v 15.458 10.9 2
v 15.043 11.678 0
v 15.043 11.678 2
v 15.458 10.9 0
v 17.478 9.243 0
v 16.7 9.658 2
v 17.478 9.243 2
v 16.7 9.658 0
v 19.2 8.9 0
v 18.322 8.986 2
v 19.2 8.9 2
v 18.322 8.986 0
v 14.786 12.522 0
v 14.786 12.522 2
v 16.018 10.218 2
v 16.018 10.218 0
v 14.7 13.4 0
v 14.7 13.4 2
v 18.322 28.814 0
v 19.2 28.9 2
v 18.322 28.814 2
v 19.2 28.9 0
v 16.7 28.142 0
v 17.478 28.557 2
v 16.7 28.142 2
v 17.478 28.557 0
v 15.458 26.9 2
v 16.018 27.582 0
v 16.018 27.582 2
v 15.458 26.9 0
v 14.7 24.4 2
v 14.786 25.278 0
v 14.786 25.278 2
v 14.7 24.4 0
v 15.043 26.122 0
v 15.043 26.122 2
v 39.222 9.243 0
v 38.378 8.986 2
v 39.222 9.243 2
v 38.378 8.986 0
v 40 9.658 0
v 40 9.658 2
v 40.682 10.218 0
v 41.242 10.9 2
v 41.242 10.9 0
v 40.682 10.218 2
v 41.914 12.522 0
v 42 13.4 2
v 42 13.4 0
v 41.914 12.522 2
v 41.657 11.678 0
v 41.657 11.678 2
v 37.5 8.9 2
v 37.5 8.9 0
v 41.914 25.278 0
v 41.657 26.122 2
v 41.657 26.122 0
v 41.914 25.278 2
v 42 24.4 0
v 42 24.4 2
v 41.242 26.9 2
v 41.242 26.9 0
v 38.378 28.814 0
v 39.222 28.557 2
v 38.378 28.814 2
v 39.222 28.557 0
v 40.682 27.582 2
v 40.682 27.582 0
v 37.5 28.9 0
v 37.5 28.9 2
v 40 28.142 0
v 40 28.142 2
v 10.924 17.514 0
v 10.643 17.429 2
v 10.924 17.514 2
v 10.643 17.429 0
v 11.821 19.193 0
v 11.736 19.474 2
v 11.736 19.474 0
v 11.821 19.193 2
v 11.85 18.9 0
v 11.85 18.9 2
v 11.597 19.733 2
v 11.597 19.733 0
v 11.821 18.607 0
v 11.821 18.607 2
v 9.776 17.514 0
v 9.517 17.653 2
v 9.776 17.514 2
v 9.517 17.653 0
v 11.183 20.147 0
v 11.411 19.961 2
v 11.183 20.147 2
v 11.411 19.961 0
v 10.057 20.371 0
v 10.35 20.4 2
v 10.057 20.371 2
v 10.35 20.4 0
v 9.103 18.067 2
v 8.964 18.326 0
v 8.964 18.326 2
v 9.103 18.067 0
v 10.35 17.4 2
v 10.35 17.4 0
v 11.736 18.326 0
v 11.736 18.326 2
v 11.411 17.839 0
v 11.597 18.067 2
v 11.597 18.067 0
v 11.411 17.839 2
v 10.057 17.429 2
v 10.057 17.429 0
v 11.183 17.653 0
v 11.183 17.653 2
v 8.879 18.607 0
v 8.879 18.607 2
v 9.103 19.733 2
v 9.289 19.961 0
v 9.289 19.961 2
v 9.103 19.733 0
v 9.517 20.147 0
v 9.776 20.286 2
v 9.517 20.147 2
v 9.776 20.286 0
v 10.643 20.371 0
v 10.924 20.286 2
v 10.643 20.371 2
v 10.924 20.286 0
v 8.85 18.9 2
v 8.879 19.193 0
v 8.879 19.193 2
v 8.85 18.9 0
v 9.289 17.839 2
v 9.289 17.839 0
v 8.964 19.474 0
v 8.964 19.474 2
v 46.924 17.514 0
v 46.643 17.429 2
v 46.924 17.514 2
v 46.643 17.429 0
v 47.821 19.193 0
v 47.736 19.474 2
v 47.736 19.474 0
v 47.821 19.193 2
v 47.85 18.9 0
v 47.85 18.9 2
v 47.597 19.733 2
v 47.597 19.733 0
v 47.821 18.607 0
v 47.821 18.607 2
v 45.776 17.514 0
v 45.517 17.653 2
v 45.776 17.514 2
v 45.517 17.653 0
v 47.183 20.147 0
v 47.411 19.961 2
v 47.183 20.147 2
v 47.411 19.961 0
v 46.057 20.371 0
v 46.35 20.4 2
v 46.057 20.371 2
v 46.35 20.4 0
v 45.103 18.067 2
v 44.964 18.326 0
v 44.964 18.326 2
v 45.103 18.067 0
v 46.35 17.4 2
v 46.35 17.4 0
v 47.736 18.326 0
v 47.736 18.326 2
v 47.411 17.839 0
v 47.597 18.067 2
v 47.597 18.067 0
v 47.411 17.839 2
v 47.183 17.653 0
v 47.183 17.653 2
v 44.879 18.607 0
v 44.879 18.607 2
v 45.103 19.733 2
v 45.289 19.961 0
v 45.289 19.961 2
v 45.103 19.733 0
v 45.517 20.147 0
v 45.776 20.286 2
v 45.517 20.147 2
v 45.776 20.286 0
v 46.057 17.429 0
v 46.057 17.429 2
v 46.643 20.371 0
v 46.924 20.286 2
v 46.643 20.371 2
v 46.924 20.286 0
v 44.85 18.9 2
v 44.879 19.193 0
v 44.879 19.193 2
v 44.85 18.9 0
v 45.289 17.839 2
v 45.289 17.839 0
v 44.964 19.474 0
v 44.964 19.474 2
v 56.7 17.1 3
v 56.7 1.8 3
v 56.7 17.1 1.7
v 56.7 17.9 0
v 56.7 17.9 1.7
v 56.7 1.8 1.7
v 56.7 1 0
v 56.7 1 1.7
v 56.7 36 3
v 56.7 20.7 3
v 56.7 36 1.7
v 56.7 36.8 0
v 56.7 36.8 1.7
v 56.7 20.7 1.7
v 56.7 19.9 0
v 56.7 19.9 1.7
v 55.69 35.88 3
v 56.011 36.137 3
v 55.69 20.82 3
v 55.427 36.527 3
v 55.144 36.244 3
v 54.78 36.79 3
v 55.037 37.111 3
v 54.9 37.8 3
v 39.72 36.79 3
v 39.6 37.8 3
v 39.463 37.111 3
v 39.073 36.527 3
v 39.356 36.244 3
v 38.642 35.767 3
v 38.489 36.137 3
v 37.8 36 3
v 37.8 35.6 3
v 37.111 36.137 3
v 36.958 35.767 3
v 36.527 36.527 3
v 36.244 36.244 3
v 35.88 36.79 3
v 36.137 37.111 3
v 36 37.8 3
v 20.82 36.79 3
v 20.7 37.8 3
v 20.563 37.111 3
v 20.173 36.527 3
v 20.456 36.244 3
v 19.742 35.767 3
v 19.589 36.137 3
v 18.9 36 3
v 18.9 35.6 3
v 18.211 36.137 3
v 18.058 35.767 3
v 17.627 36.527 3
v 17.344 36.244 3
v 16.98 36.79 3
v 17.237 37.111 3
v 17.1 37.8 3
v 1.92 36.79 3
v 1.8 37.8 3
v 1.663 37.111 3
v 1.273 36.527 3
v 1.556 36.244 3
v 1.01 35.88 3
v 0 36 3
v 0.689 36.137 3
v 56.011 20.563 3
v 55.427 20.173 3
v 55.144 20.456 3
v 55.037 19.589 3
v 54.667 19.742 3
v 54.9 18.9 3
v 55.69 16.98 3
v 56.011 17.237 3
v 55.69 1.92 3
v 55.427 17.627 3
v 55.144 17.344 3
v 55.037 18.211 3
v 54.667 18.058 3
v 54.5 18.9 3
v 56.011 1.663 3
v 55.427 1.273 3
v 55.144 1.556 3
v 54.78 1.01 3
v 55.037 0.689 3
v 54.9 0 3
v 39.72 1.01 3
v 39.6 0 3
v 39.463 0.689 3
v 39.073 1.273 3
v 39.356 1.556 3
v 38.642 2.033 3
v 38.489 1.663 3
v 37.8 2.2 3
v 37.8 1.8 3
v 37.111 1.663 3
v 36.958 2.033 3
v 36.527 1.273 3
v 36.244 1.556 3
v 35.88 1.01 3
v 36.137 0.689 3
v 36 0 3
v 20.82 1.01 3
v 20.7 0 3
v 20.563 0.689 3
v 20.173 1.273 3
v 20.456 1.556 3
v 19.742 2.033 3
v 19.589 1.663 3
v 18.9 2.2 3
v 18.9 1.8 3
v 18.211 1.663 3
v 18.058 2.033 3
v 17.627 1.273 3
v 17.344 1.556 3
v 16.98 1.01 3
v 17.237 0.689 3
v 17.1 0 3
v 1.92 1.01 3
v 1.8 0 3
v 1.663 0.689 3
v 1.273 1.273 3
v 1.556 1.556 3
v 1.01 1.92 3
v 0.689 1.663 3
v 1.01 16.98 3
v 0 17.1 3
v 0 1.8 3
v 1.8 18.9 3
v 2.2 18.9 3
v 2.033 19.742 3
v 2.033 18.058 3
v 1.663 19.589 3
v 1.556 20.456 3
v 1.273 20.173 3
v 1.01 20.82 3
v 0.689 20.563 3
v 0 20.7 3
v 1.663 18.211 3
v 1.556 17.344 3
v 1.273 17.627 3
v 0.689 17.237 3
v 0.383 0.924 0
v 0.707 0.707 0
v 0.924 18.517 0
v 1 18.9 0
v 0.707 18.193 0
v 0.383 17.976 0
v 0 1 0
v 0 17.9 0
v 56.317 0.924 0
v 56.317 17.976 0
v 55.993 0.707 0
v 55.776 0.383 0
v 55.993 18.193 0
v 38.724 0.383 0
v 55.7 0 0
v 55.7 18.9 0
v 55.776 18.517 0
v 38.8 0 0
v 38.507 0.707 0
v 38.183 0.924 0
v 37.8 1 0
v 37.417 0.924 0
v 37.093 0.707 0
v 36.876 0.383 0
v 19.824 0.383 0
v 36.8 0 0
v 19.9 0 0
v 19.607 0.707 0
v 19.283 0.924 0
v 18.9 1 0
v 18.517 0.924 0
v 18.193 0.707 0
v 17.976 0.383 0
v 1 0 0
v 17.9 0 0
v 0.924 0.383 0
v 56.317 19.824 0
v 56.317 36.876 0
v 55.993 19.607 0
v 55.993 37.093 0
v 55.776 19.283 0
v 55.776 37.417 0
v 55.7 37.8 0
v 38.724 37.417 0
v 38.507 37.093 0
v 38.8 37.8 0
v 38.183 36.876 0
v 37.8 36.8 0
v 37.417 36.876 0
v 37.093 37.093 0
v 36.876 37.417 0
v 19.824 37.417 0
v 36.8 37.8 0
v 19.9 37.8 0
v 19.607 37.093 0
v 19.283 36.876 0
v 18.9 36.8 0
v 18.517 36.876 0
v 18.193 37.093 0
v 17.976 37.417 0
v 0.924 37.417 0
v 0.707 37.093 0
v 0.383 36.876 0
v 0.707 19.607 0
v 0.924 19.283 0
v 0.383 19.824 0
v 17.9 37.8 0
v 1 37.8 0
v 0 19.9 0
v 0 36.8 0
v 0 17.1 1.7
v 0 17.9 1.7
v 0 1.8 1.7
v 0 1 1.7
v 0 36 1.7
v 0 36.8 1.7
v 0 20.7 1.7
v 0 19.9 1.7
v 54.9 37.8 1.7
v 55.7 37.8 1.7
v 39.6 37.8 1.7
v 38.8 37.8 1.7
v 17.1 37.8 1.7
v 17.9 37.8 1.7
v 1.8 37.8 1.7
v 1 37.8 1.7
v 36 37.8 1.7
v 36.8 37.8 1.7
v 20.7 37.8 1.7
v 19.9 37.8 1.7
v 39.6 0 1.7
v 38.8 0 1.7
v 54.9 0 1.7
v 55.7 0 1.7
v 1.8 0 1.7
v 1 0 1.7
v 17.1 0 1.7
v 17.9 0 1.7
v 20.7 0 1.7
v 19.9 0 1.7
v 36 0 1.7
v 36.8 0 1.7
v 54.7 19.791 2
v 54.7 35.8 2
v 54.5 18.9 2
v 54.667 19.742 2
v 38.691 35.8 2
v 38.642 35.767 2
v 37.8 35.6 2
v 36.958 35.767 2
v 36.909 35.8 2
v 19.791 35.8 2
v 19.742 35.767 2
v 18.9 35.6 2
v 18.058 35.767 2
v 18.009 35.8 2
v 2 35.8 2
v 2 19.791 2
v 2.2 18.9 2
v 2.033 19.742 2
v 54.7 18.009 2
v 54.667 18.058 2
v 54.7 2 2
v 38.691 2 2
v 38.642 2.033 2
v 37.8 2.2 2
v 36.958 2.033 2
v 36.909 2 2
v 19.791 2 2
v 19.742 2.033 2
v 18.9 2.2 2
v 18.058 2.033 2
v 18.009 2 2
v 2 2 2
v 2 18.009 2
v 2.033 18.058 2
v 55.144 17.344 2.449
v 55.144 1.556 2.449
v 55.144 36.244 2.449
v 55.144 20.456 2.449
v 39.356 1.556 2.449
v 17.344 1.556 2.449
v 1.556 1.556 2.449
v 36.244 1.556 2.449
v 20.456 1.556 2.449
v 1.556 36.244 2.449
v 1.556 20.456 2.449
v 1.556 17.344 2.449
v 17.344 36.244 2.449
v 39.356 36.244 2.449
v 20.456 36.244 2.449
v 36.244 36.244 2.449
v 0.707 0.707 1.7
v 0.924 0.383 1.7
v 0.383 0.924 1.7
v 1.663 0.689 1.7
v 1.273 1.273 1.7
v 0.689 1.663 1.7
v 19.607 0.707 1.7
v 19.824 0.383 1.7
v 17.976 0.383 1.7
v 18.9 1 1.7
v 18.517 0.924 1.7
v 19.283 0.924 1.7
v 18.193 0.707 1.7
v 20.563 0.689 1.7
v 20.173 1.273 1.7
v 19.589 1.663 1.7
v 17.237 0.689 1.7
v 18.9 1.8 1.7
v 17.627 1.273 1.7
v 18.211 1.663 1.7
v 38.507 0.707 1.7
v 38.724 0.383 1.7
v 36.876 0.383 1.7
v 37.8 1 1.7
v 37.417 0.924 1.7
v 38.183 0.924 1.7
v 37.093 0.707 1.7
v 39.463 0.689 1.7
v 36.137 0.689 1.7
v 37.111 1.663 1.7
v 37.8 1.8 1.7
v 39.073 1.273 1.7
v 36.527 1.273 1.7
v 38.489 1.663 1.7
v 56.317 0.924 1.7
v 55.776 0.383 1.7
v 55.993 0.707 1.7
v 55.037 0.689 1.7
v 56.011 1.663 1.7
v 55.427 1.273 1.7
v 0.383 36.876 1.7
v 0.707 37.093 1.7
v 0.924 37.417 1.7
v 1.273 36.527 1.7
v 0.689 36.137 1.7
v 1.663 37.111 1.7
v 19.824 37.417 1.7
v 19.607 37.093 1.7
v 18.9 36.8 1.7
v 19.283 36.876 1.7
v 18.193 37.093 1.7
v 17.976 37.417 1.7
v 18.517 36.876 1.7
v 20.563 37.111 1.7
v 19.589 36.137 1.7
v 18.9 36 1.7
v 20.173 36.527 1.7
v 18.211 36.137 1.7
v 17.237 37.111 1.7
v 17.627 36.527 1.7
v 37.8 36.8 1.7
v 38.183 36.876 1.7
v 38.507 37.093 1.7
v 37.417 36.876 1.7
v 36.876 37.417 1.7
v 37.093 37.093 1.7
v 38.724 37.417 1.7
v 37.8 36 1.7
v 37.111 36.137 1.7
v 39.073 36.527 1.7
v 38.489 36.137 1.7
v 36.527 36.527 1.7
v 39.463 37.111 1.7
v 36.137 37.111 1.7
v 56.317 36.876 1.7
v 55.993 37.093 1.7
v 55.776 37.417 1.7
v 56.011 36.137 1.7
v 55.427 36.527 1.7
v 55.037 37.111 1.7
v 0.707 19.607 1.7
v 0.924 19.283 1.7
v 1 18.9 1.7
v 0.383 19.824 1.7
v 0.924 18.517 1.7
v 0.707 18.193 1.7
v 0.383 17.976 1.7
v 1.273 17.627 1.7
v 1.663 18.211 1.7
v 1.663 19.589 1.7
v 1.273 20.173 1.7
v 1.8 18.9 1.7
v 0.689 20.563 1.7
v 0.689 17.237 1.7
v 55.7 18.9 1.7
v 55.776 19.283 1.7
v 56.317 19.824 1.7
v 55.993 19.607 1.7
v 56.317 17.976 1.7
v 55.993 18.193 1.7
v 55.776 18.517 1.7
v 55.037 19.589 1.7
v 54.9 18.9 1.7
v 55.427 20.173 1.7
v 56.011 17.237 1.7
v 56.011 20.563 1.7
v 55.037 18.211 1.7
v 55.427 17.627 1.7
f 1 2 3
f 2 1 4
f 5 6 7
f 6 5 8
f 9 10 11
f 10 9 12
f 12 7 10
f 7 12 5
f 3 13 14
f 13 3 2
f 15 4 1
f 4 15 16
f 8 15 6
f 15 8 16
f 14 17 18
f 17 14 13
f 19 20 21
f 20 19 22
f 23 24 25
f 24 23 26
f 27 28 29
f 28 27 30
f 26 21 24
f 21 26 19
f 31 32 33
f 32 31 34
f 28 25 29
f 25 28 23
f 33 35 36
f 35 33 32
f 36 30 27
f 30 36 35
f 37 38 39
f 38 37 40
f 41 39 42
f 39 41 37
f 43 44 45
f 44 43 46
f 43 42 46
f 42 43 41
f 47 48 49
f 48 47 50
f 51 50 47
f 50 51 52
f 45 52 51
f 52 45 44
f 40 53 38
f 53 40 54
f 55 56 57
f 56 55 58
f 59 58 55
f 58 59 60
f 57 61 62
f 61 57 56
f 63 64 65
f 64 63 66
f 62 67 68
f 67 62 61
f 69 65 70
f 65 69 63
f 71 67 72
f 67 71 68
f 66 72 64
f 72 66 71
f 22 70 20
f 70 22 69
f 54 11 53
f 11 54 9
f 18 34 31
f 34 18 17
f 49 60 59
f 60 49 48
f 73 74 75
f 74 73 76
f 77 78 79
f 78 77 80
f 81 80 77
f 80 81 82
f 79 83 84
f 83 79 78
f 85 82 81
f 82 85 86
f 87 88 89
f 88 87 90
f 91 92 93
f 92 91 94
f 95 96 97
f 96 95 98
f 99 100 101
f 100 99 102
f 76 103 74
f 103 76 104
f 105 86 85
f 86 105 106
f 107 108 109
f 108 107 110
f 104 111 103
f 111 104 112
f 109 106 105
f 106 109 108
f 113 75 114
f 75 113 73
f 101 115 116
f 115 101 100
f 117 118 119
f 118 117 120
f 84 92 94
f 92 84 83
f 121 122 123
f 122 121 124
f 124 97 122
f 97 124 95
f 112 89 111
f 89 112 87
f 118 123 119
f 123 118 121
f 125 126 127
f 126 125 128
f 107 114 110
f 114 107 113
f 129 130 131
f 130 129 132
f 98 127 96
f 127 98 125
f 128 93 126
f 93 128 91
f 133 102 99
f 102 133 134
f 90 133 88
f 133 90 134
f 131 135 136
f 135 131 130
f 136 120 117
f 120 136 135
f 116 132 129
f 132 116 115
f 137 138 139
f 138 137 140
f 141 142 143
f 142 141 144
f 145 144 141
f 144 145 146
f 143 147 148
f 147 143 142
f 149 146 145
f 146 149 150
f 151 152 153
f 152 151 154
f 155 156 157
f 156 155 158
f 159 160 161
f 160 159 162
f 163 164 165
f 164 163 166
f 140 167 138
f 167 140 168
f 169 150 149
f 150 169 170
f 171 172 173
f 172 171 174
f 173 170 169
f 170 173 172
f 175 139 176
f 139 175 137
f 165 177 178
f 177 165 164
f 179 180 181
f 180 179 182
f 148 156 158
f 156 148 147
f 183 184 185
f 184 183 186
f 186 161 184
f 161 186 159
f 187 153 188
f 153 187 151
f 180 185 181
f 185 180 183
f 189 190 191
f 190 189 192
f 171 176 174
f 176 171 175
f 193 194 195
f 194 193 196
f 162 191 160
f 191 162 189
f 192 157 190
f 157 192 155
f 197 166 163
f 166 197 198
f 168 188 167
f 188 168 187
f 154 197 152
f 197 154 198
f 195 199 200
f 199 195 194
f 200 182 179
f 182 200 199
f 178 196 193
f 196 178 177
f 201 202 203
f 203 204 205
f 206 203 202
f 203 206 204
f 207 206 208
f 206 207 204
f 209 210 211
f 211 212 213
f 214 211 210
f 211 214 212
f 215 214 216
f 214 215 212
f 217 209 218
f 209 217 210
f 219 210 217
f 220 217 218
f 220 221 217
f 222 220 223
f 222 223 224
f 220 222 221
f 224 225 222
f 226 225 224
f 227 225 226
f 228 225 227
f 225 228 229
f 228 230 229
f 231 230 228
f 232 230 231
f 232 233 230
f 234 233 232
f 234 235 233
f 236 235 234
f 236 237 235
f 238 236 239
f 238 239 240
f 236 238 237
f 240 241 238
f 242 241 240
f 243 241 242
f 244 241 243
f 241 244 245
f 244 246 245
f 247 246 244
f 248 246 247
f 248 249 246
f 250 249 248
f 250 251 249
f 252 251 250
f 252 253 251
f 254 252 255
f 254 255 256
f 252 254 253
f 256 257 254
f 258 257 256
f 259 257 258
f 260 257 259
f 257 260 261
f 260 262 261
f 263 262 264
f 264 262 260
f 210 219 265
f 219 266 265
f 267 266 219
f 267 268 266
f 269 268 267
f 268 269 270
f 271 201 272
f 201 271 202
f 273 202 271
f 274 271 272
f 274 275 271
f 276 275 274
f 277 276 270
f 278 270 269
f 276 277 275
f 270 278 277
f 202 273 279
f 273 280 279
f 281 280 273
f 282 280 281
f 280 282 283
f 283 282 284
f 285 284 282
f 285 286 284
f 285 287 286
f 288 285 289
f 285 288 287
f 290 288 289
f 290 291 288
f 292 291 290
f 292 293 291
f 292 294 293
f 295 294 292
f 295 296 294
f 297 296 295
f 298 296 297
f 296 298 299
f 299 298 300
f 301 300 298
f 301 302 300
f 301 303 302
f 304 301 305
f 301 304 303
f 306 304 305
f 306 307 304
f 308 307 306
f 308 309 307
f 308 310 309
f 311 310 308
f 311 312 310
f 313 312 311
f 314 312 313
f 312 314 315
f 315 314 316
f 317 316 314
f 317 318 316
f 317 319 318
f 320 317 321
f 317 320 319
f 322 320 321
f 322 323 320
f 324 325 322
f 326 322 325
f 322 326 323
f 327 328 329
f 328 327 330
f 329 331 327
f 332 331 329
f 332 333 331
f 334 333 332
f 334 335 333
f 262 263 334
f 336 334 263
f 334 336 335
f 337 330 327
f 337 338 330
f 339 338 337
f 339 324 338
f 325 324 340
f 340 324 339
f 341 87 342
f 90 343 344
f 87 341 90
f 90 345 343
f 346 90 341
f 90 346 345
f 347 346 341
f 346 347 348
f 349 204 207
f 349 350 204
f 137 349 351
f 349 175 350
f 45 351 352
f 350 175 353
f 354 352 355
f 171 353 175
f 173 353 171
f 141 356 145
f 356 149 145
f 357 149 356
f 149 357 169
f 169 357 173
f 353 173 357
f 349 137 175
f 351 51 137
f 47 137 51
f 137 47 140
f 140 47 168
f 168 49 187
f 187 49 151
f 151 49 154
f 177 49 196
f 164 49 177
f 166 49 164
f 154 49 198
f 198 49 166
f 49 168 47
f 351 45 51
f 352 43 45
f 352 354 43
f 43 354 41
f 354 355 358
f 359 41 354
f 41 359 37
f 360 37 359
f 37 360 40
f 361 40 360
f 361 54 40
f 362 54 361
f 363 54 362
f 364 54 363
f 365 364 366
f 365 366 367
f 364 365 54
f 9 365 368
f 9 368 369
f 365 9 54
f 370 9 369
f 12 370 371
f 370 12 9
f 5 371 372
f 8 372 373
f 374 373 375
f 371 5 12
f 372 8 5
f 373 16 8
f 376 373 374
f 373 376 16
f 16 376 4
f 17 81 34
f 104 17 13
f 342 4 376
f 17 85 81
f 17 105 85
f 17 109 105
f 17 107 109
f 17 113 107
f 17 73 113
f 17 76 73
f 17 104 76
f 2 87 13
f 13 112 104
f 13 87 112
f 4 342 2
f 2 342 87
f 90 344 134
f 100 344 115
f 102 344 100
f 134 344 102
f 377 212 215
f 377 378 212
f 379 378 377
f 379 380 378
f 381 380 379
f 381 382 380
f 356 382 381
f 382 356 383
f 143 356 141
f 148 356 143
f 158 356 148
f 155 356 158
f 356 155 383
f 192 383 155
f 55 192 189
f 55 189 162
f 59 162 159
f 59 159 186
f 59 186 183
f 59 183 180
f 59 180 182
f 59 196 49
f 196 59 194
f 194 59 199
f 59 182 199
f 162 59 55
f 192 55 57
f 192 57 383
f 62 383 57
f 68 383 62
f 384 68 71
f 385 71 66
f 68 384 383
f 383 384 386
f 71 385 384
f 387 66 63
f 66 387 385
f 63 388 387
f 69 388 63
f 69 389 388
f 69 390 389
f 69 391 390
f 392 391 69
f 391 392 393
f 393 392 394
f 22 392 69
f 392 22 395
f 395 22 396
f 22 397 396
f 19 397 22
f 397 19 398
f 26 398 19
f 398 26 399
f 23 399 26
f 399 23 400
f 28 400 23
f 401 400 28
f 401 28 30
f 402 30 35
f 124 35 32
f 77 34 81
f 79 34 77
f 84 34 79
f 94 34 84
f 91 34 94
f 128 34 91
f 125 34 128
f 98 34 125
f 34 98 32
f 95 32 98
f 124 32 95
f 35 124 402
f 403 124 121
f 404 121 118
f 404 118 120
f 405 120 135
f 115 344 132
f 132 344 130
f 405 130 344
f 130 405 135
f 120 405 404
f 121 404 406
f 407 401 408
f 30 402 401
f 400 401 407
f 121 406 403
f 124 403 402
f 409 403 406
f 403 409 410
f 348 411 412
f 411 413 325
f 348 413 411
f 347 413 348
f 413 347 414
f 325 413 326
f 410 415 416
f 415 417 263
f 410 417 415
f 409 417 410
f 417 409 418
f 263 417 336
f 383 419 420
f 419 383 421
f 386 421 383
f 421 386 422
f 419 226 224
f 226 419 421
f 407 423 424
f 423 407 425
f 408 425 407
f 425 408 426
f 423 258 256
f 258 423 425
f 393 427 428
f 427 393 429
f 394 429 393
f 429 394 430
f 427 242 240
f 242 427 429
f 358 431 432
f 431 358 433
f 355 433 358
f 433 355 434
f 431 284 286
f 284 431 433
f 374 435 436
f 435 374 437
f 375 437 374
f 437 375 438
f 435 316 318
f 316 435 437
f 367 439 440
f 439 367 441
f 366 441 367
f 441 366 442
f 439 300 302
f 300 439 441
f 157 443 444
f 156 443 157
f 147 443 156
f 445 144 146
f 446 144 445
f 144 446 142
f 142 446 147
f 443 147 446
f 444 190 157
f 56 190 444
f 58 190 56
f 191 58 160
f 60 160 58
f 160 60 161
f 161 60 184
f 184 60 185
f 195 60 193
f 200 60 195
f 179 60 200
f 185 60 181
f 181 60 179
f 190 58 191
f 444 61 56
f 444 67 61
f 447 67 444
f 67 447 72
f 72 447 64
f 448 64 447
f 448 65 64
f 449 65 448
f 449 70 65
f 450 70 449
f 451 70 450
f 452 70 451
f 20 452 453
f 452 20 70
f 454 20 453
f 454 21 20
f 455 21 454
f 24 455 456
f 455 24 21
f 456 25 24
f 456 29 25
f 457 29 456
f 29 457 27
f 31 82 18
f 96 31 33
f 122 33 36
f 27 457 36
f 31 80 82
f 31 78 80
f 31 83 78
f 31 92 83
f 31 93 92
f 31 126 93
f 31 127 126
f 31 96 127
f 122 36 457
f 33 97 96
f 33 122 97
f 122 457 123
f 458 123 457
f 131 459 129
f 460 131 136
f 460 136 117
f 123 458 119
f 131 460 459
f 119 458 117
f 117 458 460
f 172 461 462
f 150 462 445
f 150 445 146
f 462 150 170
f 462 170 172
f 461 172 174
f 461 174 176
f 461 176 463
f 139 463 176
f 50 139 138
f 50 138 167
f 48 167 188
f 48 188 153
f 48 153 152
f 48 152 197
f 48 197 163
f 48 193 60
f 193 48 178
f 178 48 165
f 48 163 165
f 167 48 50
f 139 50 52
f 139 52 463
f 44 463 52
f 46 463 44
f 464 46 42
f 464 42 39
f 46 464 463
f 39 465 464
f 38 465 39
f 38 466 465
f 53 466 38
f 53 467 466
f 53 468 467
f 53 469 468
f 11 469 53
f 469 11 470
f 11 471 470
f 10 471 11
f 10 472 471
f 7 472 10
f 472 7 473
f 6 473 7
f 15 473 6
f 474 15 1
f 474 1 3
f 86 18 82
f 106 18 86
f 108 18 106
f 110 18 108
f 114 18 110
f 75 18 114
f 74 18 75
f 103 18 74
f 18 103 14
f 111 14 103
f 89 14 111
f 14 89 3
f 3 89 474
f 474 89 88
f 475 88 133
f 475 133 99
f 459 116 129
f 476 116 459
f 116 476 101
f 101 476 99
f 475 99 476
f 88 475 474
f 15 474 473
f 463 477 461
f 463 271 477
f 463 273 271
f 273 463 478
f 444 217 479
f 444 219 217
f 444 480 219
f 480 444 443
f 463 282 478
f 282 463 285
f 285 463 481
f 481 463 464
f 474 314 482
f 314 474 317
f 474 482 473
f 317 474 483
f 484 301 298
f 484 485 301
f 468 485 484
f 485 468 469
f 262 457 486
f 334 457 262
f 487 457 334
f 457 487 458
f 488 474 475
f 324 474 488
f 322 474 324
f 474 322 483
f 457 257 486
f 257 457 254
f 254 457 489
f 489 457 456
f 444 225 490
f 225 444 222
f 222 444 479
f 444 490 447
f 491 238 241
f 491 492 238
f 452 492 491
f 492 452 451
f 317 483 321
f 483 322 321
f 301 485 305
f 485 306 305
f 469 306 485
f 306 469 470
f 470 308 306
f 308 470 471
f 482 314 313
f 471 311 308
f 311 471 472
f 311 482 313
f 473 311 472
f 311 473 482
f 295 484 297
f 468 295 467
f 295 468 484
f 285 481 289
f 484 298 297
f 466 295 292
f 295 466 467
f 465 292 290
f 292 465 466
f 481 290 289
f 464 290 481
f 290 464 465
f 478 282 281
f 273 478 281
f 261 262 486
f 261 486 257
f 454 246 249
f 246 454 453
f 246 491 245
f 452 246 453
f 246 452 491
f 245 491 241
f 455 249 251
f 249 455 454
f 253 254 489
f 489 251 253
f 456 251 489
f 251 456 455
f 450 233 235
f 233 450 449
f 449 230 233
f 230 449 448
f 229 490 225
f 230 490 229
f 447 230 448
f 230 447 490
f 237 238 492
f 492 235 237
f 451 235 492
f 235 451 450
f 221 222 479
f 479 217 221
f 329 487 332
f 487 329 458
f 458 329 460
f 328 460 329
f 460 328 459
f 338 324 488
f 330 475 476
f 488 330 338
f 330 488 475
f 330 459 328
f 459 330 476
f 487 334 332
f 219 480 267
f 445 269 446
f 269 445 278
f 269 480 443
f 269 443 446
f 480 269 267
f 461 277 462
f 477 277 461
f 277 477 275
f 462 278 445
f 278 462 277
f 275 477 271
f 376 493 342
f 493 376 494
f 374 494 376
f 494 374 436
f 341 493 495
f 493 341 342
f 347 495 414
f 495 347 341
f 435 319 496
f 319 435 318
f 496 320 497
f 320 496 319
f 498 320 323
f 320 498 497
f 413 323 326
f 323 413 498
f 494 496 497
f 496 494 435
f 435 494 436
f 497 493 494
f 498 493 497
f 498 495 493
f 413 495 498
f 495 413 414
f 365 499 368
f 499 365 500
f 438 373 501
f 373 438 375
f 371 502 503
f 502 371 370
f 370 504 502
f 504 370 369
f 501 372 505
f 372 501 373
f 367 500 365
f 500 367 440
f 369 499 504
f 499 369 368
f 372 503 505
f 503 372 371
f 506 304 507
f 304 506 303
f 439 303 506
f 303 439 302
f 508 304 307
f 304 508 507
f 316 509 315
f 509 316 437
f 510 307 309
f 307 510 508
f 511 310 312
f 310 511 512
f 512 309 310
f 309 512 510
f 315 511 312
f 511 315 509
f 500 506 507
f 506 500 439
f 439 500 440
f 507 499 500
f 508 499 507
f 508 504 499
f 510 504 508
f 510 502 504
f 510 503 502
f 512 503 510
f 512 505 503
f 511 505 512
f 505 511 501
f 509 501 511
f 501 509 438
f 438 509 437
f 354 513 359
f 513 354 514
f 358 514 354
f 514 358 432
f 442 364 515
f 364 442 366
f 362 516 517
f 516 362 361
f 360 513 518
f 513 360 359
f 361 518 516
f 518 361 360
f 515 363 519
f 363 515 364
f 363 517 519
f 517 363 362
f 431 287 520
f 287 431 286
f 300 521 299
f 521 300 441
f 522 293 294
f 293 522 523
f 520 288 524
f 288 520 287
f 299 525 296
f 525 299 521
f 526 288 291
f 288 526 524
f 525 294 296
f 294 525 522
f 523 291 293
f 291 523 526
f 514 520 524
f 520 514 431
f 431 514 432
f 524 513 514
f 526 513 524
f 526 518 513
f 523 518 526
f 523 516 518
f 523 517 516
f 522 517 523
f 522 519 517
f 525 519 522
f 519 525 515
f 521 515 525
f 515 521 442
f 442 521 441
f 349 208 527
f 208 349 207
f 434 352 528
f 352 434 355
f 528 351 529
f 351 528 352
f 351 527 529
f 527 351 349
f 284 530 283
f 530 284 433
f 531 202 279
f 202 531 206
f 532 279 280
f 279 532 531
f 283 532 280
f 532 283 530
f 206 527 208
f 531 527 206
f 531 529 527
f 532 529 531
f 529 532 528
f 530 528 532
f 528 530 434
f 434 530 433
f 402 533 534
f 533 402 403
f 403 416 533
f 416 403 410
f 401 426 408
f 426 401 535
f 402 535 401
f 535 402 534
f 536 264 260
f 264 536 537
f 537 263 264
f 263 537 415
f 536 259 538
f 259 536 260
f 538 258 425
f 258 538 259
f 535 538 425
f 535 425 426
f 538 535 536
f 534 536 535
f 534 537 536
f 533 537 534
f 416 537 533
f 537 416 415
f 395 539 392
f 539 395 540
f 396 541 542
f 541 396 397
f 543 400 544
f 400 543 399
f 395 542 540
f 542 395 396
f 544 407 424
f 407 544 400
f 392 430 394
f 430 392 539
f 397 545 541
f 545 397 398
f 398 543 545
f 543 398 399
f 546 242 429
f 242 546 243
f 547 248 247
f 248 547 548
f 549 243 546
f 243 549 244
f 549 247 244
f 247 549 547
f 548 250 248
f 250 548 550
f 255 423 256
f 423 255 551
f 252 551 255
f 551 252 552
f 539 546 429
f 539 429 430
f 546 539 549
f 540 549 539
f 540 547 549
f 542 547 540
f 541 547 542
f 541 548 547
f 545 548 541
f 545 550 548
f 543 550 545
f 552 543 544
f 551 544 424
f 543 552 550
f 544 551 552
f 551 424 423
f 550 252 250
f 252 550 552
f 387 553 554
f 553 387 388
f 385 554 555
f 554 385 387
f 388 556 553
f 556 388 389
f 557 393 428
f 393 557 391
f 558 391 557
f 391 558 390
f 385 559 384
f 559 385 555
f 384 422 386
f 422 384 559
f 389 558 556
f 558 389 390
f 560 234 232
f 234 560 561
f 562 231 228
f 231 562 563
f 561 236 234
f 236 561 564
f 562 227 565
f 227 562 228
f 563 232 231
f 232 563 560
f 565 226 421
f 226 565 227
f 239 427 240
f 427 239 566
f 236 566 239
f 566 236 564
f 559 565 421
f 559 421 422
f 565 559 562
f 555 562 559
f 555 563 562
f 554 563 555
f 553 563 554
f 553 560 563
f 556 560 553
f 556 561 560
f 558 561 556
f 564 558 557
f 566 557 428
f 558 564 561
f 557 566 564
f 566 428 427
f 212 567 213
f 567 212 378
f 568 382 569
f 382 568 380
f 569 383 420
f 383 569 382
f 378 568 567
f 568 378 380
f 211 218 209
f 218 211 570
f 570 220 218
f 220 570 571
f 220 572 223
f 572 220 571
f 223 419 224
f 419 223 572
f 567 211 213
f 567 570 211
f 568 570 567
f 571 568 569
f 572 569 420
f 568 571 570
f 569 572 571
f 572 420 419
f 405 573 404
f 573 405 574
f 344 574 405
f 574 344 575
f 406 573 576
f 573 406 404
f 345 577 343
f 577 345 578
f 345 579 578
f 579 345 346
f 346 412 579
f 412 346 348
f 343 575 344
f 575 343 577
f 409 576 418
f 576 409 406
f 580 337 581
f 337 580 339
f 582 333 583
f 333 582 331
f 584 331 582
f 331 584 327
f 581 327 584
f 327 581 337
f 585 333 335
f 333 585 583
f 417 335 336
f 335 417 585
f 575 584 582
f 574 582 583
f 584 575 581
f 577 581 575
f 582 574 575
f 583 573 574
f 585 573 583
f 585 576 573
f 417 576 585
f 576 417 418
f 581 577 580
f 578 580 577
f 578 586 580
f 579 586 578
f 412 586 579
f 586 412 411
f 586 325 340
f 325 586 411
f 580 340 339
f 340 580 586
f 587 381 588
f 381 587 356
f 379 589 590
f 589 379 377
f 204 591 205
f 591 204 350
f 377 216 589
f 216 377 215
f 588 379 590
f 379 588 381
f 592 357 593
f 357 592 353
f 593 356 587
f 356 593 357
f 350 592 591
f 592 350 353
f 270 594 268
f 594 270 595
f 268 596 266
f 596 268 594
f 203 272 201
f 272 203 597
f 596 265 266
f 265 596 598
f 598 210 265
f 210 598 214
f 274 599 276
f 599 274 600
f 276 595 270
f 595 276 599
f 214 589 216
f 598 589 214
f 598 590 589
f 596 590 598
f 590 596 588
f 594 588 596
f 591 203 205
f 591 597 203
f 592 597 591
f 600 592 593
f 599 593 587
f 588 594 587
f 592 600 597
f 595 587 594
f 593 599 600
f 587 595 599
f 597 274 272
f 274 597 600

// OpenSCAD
//OpenSCAD-Skript

//Moduldefinition mit Parametern für Frontplattensystem im 19mm-Raster
module FrontElem (
//Parameter
//Frontplattenelement
xwert=3,        //Anzahl der Segmente in horizontaler Richtung
ywert=2,        //Anzahl der Segmente in vertikaler Richtung
segment=18.9,   //Kantenlänge des Segments
hght=3.0,       //Höhe des Rands des Frontplattensegments
thick=2.0,      //verbleibende Dicke des Frontplattensegments
wo=1.0,         //Wandstärke oben
wu=2.0,         //Wandstärke unten
//M3-Schrauben
M3=false,       //Bohrungen für M3-Zylinderkopf-Inbusschraube
skd3=5.6,       //Schraubenkopfdurchmesser M3-Schraube
skh3=3.3,       //Schraubenkopfhöhe M3-Schraube
dsh3=3.1,       //Schaftdurchmesser M3-Schraube
dvst3=7,        //Verstärkung für M3-Schraube
//Schneidschrauben 2mmx6mm
B2mm=true,      //Bohrungen für 2mm-Schneidschrauben
skd2=3.6,       //Schraubenkopfdurchmesser 2mm-Schraube (4.4)
skh2=1.3,       //Schraubenkopfhöhe 2mm-Schraube
dsh2=2.0,       //Schaftdurchmesser 2mm-Schraube
dvst2=4.4,      //Verstärkung für 2mm-Schraube
//Beschriftungsfeld eingesenkt
Btext=6.0,      //Breite Beschriftungsband
Ltext=12,       //Länge Beschriftungsband
Dtext=0.3,      //Tiefe Beschriftungsfeld, oder Null
//LED 3mm
LEDdia=3.0,     //Durchmesser LED
//Quadrat-LED
LEDr=5.0,       //Kantenlänge quadratische LED
//Rechteck-LED
LEDB=5.0,       //Breite der Rechteck-LED
LEDH=3.0,       //Höhe der Rechteck-LED
//Hebel-Kippschalter
KSWdia=6.0,     //Schaftdurchmesser Kippschalter
//Drehschalter
RSWdia=9.2,     //Schaftdurchmesser Drehschalter
RSWdist=9.4,    //Mittenabstand Pin
RSWpin=3.0,     //Durchmesser Pin
//Bohrung für Potischaft 6mm
POTdia=6.8,     //Schaftdurchmesser Poti
//Polklemme M4
TRMdia=4.0,     //Bohrung für Polklemme M4
TRSdia=6.0,     //Bohrung für Telefonbuchse 4mm
//MC-Einbaubuchse
MCdia=11.8,     //Bohrung für MC-Buchse 4mm
MCdist=10.4,    //Abstand Abflachungen
//BNC-Einbaubuchse
BNCdia=9.5,     //Durchmesser Bohrung
BNCdist=8.0,    //Abstand Abflachung
//Panelmeter 3-stellig
PM3B=22.5,      //Breite Panelmeter 3-stellig
PM3H=14.5,      //Höhe Panelmeter 3-stellig
//Panelmeter 4-stellig
PM4B=30.0,      //Breite Panelmeter 4-stellig
PM4H=14.2,      //Höhe Panelmeter 4-stellig
//Kaltgerätestecker
KGSW=27.3,      //Länge Ausschnitt in x-Richtung Kaltgerätestecker
KGSH=20,        //Höhe Ausschnitt in y-Richtung Kaltgerätestecker
KGSR=9          //Rundungsdurchmesser Ausschnitt Kaltgerätestecker
)
//Beginn Modul
{
difference(){   //difference 1
union(){        //union 1
difference(){   //difference 2
union(){        //union 2
    //alles, was vor der nächsten geschweiften Klammer steht, wird zusammengefügt (union 2)
//Körper des Frontplattensegments
cube([xwert*segment, ywert*segment, hght]);


}               //union 2 end
    //alles, was vor der nächsten geschweiften Klammer steht, wird davon abgezogen (difference 2)
//Einsenkung in das Segment
polyhedron(
               points= [[wu,wu,thick],                                  //0 unten
                        [xwert*segment-wu,wu,thick],                    //1 unten
                        [xwert*segment-wu,ywert*segment-wu,thick],      //2 unten
                        [wu,ywert*segment-wu,thick],                    //3 unten
                        [wo,wo,hght+0.01],                              //4 oben
                        [wo,ywert*segment-wo, hght+0.01],               //5 oben
                        [xwert*segment-wo,ywert*segment-wo,hght+0.01],  //6 oben
                        [xwert*segment-wo,wo,hght+0.01],                //7 oben
                       ],
               faces=  [[0,1,2,3],      //Boden
                        [0,4,7,1],      //Deckel
                        [1,7,6,2],      //Front
                        [2,6,5,3],      //Seitenwand rechts
                        [3,5,4,0],      //Rückwand
                        [4,5,6,7]]      //Seitenwand links
               );   

/*
//Ausschnitt Schalter
translate([xwert*segment/2-30/2,ywert*segment/2+4.5,-0.1]) cube([30,11,20]);
*/
//Ausschnitt Kaltgerätestecker
translate([0,0,0]) {
//Mittenausschnitt
translate([xwert*segment/2-KGSW/2+KGSR/2,ywert*segment/2-KGSH/2+KGSR/2,-0.1]) cube([KGSW-KGSR,KGSH-KGSR,20]);
//Rundungen
translate([xwert*segment/2-KGSW/2+KGSR/2,ywert*segment/2-KGSH/2+KGSR/2,-0.1])cylinder(d=KGSR,h=20,$fn=32);
translate([xwert*segment/2-KGSW/2+KGSR/2,ywert*segment/2+KGSH/2-KGSR/2,-0.1])cylinder(d=KGSR,h=20,$fn=32);
translate([xwert*segment/2+KGSW/2-KGSR/2,ywert*segment/2-KGSH/2+KGSR/2,-0.1])cylinder(d=KGSR,h=20,$fn=32);
translate([xwert*segment/2+KGSW/2-KGSR/2,ywert*segment/2+KGSH/2-KGSR/2,-0.1])cylinder(d=KGSR,h=20,$fn=32);
//Seitensegmente
translate([xwert*segment/2-KGSW/2+KGSR/2,ywert*segment/2+KGSH/2-KGSR/2-0.1,-0.1]) cube([KGSW-KGSR,KGSR/2+0.1,20]);
translate([xwert*segment/2-KGSW/2+KGSR/2,ywert*segment/2-KGSH/2,-0.1]) cube([KGSW-KGSR,KGSR/2+0.1,20]);
translate([xwert*segment/2-KGSW/2,ywert*segment/2-KGSH/2+KGSR/2,-0.1]) cube([KGSR/2+0.1,KGSH-KGSR,20]);
translate([xwert*segment/2+KGSW/2-KGSR/2-0.1,ywert*segment/2-KGSH/2+KGSR/2,-0.1]) cube([KGSR/2+0.1,KGSH-KGSR,20]);
//Schraubenlöcher
translate([xwert*segment/2-36/2,ywert*segment/2,-0.1])cylinder(d=3,h=20,$fn=32);
translate([xwert*segment/2+36/2,ywert*segment/2,-0.1])cylinder(d=3,h=20,$fn=32);

};
/*
//Bohrung für LED mittig (Mindestgröße 1x1)
translate([xwert*segment/2,ywert*segment/2-3,-0.1])  cylinder(d=LEDdia, h=10, $fn=32);
*/

/*
//Bohrung für 2x 3mm-LED nach unten versetzt mit Textfeld darüber (Mindestgröße 1x1, bei 10mm LED 1x2)
translate([xwert*segment/2-3,ywert*segment/2-3,-0.1])  cylinder(d=LEDdia, h=10, $fn=32);
translate([xwert*segment/2+3,ywert*segment/2-3,-0.1])  cylinder(d=LEDdia, h=10, $fn=32);
translate([xwert*segment/2-Ltext/2,ywert*segment/2,thick-Dtext+0.05])  cube([Ltext, Btext, Dtext]); 
*/

/*
//Bohrung für Kippschalter mittig (Mindestgröße 1x1)
translate([xwert*segment/2,ywert*segment/2,-0.1])  cylinder(d=KSWdia, h=10, $fn=32); 
*/

/*
//Bohrungen für Drehschalter mit Pin (Mindestgröße 2x2)
translate([xwert*segment/2,ywert*segment/2,-0.1])  cylinder(d=RSWdia, h=10, $fn=32);
translate([xwert*segment/2+RSWdist,ywert*segment/2,-0.1])  cylinder(d=RSWpin, h=1.5, $fn=32);
*/

/*
//Bohrung für Potentiometer 3mm-Schaft (Mindestgröße 1x1)
translate([xwert*segment/2,ywert*segment/2,-0.1])  cylinder(d=POTdia, h=10, $fn=32);
*/

/*
//Bohrung für 2x 4mm-Polklemme M4 (Mindestgröße 1x1)
translate([xwert*segment/2-10,ywert*segment/2,-0.1])  cylinder(d=TRMdia, h=10, $fn=32);
translate([xwert*segment/2+10,ywert*segment/2,-0.1])  cylinder(d=TRMdia, h=10, $fn=32);
*/
/*
//Bohrung für 4mm-Telefonbuchse (Mindestgröße 1x1)
translate([xwert*segment/2,ywert*segment/2,-0.1])  cylinder(d=TRSdia, h=10, $fn=32);
*/

/*
//Bohrung für 4mm-MC-Buchse (Mindestgröße 2x2), siehe auch union1 für Abflachungen
translate([xwert*segment/2,ywert*segment/2,-0.1])  cylinder(d=MCdia, h=10, $fn=32);
*/

/*
//Bohrung für BNC-Buchse (Mindestgröße 1x1), siehe auch union1 für Abflachungen
translate([xwert*segment/2,ywert*segment/2,-0.1])  cylinder(d=BNCdia, h=10, $fn=32);
*/

/*
//Ausschnitt Panelmeter 3-stellig (Mindestgröße 2x1)
translate([xwert*segment/2-PM3B/2,ywert*segment/2-PM3H/2,-0.1])  cube([PM3B, PM3H, 10]);
*/

/*
//Ausschnitt Panelmeter 4-stellig (Mindestgröße 2x1)
translate([xwert*segment/2-PM4B/2,ywert*segment/2-PM4H/2,-0.1])  cube([PM4B, PM4H, 10]);
*/       
        
}  //difference 2 end
    //alles, was vor der nächsten geschweiften Klammer steht, wird dazu hinzugefügt (union 1)
//Verstärkungen für Schrauben x-Achse unten
for (x=[0:segment:xwert*segment])
{
if (M3==true) translate([x,0,0]) cylinder(d=dvst3,h=hght,$fn=16);
if (B2mm==true) translate([x,0,0]) cylinder(d=dvst2,h=hght,$fn=16);
}
//Verstärkungen für Schrauben x-Achse oben
for (x=[0:segment:xwert*segment])
{
if (M3==true) translate([x,ywert*segment,0]) cylinder(d=dvst3,h=hght,$fn=16);
if (B2mm==true) translate([x,ywert*segment,0]) cylinder(d=dvst2,h=hght,$fn=16);
}
//Verstärkungen für Schrauben y-Achse links
for (y=[0:segment:ywert*segment])
{
if (M3==true) translate([0,y,0]) cylinder(d=dvst3,h=hght,$fn=16);
if (B2mm==true) translate([0,y,0]) cylinder(d=dvst2,h=hght,$fn=16);
}
//Verstärkungen für Schrauben y-Achse rechts
for (y=[0:segment:ywert*segment])
{
if (M3==true) translate([xwert*segment,y,0]) cylinder(d=dvst3,h=hght,$fn=16);
if (B2mm==true) translate([xwert*segment,y,0]) cylinder(d=dvst2,h=hght,$fn=16);
}

/*
//Abflachungen für 4mm-MC-Buchse (Mindestgröße 2x2)
translate([xwert*segment/2-5,ywert*segment/2+MCdist/2,0])  cube([10,3,thick]);
translate([xwert*segment/2-5,ywert*segment/2-MCdist/2-3,0])  cube([10,3,thick]);
*/

/*
//Abflachungen für BNC-Buchse (Mindestgröße 1x1)
translate([xwert*segment/2-5,ywert*segment/2+BNCdist/2,0])  cube([10,3,thick]);
translate([xwert*segment/2-5,ywert*segment/2-BNCdist/2-3,0])  cube([10,3,thick]);
*/

}               //union 1 end
    //alles, was vor der nächsten geschweiften Klammer steht, wird davon wieder abgezogen (difference 1)
//Bohrungen für Schrauben x-Achse unten
for (x=[0:segment:xwert*segment])
{
if (M3==true) translate([x,0,-0.1]) cylinder(d=dsh3,h=2*hght,$fn=16);
if (M3==true) translate([x,0,hght-skh3]) cylinder(d=skd3,h=2*hght,$fn=16);
if (B2mm==true) translate([x,0,-0.1]) cylinder(d=dsh2,h=2*hght,$fn=16);
if (B2mm==true) translate([x,0,hght-skh2]) cylinder(d=skd2,h=2*hght,$fn=16); 
}
//Bohrungen für Schrauben x-Achse oben
for (x=[0:segment:xwert*segment])
{
if (M3==true) translate([x,ywert*segment,-0.1]) cylinder(d=dsh3,h=2*hght,$fn=16);
if (M3==true) translate([x,ywert*segment,hght-skh3]) cylinder(d=skd3,h=2*hght,$fn=16);
if (B2mm==true) translate([x,ywert*segment,-0.1]) cylinder(d=dsh2,h=2*hght,$fn=16);
if (B2mm==true) translate([x,ywert*segment,hght-skh2]) cylinder(d=skd2,h=2*hght,$fn=16); 
}
//Bohrungen für Schrauben y-Achse links
for (y=[0:segment:ywert*segment])
{
if (M3==true) translate([0,y,-0.1]) cylinder(d=dsh3,h=2*hght,$fn=16);
if (M3==true) translate([0,y,hght-skh3]) cylinder(d=skd3,h=2*hght,$fn=16);
if (B2mm==true) translate([0,y,-0.1]) cylinder(d=dsh2,h=2*hght,$fn=16);
if (B2mm==true) translate([0,y,hght-skh2]) cylinder(d=skd2,h=2*hght,$fn=16); 
}
//Bohrungen für Schrauben y-Achse rechts
for (y=[0:segment:ywert*segment])
{
if (M3==true) translate([xwert*segment,y,-0.1]) cylinder(d=dsh3,h=2*hght,$fn=16);
if (M3==true) translate([xwert*segment,y,hght-skh3]) cylinder(d=skd3,h=2*hght,$fn=16);
if (B2mm==true) translate([xwert*segment,y,-0.1]) cylinder(d=dsh2,h=2*hght,$fn=16);
if (B2mm==true) translate([xwert*segment,y,hght-skh2]) cylinder(d=skd2,h=2*hght,$fn=16); 
}
//Abschneiden Verstärkungen unten
translate([-250,-10,-0.1])
cube([500,10,25]);
//Abschneiden Verstärkungen oben
translate([-250,ywert*segment,-0.1])
cube([500,10,25]);
//Abschneiden Verstärkungen links
translate([-10,-250,-0.1])
cube([10,500,25]);
//Abschneiden Verstärkungen rechts
translate([xwert*segment,-250,-0.1])
cube([10,500,25]);
}               //difference 1 end

}  //module end

//Hier werden Instanzen des Moduls aufgerufen
translate([0,0,0]) FrontElem();
